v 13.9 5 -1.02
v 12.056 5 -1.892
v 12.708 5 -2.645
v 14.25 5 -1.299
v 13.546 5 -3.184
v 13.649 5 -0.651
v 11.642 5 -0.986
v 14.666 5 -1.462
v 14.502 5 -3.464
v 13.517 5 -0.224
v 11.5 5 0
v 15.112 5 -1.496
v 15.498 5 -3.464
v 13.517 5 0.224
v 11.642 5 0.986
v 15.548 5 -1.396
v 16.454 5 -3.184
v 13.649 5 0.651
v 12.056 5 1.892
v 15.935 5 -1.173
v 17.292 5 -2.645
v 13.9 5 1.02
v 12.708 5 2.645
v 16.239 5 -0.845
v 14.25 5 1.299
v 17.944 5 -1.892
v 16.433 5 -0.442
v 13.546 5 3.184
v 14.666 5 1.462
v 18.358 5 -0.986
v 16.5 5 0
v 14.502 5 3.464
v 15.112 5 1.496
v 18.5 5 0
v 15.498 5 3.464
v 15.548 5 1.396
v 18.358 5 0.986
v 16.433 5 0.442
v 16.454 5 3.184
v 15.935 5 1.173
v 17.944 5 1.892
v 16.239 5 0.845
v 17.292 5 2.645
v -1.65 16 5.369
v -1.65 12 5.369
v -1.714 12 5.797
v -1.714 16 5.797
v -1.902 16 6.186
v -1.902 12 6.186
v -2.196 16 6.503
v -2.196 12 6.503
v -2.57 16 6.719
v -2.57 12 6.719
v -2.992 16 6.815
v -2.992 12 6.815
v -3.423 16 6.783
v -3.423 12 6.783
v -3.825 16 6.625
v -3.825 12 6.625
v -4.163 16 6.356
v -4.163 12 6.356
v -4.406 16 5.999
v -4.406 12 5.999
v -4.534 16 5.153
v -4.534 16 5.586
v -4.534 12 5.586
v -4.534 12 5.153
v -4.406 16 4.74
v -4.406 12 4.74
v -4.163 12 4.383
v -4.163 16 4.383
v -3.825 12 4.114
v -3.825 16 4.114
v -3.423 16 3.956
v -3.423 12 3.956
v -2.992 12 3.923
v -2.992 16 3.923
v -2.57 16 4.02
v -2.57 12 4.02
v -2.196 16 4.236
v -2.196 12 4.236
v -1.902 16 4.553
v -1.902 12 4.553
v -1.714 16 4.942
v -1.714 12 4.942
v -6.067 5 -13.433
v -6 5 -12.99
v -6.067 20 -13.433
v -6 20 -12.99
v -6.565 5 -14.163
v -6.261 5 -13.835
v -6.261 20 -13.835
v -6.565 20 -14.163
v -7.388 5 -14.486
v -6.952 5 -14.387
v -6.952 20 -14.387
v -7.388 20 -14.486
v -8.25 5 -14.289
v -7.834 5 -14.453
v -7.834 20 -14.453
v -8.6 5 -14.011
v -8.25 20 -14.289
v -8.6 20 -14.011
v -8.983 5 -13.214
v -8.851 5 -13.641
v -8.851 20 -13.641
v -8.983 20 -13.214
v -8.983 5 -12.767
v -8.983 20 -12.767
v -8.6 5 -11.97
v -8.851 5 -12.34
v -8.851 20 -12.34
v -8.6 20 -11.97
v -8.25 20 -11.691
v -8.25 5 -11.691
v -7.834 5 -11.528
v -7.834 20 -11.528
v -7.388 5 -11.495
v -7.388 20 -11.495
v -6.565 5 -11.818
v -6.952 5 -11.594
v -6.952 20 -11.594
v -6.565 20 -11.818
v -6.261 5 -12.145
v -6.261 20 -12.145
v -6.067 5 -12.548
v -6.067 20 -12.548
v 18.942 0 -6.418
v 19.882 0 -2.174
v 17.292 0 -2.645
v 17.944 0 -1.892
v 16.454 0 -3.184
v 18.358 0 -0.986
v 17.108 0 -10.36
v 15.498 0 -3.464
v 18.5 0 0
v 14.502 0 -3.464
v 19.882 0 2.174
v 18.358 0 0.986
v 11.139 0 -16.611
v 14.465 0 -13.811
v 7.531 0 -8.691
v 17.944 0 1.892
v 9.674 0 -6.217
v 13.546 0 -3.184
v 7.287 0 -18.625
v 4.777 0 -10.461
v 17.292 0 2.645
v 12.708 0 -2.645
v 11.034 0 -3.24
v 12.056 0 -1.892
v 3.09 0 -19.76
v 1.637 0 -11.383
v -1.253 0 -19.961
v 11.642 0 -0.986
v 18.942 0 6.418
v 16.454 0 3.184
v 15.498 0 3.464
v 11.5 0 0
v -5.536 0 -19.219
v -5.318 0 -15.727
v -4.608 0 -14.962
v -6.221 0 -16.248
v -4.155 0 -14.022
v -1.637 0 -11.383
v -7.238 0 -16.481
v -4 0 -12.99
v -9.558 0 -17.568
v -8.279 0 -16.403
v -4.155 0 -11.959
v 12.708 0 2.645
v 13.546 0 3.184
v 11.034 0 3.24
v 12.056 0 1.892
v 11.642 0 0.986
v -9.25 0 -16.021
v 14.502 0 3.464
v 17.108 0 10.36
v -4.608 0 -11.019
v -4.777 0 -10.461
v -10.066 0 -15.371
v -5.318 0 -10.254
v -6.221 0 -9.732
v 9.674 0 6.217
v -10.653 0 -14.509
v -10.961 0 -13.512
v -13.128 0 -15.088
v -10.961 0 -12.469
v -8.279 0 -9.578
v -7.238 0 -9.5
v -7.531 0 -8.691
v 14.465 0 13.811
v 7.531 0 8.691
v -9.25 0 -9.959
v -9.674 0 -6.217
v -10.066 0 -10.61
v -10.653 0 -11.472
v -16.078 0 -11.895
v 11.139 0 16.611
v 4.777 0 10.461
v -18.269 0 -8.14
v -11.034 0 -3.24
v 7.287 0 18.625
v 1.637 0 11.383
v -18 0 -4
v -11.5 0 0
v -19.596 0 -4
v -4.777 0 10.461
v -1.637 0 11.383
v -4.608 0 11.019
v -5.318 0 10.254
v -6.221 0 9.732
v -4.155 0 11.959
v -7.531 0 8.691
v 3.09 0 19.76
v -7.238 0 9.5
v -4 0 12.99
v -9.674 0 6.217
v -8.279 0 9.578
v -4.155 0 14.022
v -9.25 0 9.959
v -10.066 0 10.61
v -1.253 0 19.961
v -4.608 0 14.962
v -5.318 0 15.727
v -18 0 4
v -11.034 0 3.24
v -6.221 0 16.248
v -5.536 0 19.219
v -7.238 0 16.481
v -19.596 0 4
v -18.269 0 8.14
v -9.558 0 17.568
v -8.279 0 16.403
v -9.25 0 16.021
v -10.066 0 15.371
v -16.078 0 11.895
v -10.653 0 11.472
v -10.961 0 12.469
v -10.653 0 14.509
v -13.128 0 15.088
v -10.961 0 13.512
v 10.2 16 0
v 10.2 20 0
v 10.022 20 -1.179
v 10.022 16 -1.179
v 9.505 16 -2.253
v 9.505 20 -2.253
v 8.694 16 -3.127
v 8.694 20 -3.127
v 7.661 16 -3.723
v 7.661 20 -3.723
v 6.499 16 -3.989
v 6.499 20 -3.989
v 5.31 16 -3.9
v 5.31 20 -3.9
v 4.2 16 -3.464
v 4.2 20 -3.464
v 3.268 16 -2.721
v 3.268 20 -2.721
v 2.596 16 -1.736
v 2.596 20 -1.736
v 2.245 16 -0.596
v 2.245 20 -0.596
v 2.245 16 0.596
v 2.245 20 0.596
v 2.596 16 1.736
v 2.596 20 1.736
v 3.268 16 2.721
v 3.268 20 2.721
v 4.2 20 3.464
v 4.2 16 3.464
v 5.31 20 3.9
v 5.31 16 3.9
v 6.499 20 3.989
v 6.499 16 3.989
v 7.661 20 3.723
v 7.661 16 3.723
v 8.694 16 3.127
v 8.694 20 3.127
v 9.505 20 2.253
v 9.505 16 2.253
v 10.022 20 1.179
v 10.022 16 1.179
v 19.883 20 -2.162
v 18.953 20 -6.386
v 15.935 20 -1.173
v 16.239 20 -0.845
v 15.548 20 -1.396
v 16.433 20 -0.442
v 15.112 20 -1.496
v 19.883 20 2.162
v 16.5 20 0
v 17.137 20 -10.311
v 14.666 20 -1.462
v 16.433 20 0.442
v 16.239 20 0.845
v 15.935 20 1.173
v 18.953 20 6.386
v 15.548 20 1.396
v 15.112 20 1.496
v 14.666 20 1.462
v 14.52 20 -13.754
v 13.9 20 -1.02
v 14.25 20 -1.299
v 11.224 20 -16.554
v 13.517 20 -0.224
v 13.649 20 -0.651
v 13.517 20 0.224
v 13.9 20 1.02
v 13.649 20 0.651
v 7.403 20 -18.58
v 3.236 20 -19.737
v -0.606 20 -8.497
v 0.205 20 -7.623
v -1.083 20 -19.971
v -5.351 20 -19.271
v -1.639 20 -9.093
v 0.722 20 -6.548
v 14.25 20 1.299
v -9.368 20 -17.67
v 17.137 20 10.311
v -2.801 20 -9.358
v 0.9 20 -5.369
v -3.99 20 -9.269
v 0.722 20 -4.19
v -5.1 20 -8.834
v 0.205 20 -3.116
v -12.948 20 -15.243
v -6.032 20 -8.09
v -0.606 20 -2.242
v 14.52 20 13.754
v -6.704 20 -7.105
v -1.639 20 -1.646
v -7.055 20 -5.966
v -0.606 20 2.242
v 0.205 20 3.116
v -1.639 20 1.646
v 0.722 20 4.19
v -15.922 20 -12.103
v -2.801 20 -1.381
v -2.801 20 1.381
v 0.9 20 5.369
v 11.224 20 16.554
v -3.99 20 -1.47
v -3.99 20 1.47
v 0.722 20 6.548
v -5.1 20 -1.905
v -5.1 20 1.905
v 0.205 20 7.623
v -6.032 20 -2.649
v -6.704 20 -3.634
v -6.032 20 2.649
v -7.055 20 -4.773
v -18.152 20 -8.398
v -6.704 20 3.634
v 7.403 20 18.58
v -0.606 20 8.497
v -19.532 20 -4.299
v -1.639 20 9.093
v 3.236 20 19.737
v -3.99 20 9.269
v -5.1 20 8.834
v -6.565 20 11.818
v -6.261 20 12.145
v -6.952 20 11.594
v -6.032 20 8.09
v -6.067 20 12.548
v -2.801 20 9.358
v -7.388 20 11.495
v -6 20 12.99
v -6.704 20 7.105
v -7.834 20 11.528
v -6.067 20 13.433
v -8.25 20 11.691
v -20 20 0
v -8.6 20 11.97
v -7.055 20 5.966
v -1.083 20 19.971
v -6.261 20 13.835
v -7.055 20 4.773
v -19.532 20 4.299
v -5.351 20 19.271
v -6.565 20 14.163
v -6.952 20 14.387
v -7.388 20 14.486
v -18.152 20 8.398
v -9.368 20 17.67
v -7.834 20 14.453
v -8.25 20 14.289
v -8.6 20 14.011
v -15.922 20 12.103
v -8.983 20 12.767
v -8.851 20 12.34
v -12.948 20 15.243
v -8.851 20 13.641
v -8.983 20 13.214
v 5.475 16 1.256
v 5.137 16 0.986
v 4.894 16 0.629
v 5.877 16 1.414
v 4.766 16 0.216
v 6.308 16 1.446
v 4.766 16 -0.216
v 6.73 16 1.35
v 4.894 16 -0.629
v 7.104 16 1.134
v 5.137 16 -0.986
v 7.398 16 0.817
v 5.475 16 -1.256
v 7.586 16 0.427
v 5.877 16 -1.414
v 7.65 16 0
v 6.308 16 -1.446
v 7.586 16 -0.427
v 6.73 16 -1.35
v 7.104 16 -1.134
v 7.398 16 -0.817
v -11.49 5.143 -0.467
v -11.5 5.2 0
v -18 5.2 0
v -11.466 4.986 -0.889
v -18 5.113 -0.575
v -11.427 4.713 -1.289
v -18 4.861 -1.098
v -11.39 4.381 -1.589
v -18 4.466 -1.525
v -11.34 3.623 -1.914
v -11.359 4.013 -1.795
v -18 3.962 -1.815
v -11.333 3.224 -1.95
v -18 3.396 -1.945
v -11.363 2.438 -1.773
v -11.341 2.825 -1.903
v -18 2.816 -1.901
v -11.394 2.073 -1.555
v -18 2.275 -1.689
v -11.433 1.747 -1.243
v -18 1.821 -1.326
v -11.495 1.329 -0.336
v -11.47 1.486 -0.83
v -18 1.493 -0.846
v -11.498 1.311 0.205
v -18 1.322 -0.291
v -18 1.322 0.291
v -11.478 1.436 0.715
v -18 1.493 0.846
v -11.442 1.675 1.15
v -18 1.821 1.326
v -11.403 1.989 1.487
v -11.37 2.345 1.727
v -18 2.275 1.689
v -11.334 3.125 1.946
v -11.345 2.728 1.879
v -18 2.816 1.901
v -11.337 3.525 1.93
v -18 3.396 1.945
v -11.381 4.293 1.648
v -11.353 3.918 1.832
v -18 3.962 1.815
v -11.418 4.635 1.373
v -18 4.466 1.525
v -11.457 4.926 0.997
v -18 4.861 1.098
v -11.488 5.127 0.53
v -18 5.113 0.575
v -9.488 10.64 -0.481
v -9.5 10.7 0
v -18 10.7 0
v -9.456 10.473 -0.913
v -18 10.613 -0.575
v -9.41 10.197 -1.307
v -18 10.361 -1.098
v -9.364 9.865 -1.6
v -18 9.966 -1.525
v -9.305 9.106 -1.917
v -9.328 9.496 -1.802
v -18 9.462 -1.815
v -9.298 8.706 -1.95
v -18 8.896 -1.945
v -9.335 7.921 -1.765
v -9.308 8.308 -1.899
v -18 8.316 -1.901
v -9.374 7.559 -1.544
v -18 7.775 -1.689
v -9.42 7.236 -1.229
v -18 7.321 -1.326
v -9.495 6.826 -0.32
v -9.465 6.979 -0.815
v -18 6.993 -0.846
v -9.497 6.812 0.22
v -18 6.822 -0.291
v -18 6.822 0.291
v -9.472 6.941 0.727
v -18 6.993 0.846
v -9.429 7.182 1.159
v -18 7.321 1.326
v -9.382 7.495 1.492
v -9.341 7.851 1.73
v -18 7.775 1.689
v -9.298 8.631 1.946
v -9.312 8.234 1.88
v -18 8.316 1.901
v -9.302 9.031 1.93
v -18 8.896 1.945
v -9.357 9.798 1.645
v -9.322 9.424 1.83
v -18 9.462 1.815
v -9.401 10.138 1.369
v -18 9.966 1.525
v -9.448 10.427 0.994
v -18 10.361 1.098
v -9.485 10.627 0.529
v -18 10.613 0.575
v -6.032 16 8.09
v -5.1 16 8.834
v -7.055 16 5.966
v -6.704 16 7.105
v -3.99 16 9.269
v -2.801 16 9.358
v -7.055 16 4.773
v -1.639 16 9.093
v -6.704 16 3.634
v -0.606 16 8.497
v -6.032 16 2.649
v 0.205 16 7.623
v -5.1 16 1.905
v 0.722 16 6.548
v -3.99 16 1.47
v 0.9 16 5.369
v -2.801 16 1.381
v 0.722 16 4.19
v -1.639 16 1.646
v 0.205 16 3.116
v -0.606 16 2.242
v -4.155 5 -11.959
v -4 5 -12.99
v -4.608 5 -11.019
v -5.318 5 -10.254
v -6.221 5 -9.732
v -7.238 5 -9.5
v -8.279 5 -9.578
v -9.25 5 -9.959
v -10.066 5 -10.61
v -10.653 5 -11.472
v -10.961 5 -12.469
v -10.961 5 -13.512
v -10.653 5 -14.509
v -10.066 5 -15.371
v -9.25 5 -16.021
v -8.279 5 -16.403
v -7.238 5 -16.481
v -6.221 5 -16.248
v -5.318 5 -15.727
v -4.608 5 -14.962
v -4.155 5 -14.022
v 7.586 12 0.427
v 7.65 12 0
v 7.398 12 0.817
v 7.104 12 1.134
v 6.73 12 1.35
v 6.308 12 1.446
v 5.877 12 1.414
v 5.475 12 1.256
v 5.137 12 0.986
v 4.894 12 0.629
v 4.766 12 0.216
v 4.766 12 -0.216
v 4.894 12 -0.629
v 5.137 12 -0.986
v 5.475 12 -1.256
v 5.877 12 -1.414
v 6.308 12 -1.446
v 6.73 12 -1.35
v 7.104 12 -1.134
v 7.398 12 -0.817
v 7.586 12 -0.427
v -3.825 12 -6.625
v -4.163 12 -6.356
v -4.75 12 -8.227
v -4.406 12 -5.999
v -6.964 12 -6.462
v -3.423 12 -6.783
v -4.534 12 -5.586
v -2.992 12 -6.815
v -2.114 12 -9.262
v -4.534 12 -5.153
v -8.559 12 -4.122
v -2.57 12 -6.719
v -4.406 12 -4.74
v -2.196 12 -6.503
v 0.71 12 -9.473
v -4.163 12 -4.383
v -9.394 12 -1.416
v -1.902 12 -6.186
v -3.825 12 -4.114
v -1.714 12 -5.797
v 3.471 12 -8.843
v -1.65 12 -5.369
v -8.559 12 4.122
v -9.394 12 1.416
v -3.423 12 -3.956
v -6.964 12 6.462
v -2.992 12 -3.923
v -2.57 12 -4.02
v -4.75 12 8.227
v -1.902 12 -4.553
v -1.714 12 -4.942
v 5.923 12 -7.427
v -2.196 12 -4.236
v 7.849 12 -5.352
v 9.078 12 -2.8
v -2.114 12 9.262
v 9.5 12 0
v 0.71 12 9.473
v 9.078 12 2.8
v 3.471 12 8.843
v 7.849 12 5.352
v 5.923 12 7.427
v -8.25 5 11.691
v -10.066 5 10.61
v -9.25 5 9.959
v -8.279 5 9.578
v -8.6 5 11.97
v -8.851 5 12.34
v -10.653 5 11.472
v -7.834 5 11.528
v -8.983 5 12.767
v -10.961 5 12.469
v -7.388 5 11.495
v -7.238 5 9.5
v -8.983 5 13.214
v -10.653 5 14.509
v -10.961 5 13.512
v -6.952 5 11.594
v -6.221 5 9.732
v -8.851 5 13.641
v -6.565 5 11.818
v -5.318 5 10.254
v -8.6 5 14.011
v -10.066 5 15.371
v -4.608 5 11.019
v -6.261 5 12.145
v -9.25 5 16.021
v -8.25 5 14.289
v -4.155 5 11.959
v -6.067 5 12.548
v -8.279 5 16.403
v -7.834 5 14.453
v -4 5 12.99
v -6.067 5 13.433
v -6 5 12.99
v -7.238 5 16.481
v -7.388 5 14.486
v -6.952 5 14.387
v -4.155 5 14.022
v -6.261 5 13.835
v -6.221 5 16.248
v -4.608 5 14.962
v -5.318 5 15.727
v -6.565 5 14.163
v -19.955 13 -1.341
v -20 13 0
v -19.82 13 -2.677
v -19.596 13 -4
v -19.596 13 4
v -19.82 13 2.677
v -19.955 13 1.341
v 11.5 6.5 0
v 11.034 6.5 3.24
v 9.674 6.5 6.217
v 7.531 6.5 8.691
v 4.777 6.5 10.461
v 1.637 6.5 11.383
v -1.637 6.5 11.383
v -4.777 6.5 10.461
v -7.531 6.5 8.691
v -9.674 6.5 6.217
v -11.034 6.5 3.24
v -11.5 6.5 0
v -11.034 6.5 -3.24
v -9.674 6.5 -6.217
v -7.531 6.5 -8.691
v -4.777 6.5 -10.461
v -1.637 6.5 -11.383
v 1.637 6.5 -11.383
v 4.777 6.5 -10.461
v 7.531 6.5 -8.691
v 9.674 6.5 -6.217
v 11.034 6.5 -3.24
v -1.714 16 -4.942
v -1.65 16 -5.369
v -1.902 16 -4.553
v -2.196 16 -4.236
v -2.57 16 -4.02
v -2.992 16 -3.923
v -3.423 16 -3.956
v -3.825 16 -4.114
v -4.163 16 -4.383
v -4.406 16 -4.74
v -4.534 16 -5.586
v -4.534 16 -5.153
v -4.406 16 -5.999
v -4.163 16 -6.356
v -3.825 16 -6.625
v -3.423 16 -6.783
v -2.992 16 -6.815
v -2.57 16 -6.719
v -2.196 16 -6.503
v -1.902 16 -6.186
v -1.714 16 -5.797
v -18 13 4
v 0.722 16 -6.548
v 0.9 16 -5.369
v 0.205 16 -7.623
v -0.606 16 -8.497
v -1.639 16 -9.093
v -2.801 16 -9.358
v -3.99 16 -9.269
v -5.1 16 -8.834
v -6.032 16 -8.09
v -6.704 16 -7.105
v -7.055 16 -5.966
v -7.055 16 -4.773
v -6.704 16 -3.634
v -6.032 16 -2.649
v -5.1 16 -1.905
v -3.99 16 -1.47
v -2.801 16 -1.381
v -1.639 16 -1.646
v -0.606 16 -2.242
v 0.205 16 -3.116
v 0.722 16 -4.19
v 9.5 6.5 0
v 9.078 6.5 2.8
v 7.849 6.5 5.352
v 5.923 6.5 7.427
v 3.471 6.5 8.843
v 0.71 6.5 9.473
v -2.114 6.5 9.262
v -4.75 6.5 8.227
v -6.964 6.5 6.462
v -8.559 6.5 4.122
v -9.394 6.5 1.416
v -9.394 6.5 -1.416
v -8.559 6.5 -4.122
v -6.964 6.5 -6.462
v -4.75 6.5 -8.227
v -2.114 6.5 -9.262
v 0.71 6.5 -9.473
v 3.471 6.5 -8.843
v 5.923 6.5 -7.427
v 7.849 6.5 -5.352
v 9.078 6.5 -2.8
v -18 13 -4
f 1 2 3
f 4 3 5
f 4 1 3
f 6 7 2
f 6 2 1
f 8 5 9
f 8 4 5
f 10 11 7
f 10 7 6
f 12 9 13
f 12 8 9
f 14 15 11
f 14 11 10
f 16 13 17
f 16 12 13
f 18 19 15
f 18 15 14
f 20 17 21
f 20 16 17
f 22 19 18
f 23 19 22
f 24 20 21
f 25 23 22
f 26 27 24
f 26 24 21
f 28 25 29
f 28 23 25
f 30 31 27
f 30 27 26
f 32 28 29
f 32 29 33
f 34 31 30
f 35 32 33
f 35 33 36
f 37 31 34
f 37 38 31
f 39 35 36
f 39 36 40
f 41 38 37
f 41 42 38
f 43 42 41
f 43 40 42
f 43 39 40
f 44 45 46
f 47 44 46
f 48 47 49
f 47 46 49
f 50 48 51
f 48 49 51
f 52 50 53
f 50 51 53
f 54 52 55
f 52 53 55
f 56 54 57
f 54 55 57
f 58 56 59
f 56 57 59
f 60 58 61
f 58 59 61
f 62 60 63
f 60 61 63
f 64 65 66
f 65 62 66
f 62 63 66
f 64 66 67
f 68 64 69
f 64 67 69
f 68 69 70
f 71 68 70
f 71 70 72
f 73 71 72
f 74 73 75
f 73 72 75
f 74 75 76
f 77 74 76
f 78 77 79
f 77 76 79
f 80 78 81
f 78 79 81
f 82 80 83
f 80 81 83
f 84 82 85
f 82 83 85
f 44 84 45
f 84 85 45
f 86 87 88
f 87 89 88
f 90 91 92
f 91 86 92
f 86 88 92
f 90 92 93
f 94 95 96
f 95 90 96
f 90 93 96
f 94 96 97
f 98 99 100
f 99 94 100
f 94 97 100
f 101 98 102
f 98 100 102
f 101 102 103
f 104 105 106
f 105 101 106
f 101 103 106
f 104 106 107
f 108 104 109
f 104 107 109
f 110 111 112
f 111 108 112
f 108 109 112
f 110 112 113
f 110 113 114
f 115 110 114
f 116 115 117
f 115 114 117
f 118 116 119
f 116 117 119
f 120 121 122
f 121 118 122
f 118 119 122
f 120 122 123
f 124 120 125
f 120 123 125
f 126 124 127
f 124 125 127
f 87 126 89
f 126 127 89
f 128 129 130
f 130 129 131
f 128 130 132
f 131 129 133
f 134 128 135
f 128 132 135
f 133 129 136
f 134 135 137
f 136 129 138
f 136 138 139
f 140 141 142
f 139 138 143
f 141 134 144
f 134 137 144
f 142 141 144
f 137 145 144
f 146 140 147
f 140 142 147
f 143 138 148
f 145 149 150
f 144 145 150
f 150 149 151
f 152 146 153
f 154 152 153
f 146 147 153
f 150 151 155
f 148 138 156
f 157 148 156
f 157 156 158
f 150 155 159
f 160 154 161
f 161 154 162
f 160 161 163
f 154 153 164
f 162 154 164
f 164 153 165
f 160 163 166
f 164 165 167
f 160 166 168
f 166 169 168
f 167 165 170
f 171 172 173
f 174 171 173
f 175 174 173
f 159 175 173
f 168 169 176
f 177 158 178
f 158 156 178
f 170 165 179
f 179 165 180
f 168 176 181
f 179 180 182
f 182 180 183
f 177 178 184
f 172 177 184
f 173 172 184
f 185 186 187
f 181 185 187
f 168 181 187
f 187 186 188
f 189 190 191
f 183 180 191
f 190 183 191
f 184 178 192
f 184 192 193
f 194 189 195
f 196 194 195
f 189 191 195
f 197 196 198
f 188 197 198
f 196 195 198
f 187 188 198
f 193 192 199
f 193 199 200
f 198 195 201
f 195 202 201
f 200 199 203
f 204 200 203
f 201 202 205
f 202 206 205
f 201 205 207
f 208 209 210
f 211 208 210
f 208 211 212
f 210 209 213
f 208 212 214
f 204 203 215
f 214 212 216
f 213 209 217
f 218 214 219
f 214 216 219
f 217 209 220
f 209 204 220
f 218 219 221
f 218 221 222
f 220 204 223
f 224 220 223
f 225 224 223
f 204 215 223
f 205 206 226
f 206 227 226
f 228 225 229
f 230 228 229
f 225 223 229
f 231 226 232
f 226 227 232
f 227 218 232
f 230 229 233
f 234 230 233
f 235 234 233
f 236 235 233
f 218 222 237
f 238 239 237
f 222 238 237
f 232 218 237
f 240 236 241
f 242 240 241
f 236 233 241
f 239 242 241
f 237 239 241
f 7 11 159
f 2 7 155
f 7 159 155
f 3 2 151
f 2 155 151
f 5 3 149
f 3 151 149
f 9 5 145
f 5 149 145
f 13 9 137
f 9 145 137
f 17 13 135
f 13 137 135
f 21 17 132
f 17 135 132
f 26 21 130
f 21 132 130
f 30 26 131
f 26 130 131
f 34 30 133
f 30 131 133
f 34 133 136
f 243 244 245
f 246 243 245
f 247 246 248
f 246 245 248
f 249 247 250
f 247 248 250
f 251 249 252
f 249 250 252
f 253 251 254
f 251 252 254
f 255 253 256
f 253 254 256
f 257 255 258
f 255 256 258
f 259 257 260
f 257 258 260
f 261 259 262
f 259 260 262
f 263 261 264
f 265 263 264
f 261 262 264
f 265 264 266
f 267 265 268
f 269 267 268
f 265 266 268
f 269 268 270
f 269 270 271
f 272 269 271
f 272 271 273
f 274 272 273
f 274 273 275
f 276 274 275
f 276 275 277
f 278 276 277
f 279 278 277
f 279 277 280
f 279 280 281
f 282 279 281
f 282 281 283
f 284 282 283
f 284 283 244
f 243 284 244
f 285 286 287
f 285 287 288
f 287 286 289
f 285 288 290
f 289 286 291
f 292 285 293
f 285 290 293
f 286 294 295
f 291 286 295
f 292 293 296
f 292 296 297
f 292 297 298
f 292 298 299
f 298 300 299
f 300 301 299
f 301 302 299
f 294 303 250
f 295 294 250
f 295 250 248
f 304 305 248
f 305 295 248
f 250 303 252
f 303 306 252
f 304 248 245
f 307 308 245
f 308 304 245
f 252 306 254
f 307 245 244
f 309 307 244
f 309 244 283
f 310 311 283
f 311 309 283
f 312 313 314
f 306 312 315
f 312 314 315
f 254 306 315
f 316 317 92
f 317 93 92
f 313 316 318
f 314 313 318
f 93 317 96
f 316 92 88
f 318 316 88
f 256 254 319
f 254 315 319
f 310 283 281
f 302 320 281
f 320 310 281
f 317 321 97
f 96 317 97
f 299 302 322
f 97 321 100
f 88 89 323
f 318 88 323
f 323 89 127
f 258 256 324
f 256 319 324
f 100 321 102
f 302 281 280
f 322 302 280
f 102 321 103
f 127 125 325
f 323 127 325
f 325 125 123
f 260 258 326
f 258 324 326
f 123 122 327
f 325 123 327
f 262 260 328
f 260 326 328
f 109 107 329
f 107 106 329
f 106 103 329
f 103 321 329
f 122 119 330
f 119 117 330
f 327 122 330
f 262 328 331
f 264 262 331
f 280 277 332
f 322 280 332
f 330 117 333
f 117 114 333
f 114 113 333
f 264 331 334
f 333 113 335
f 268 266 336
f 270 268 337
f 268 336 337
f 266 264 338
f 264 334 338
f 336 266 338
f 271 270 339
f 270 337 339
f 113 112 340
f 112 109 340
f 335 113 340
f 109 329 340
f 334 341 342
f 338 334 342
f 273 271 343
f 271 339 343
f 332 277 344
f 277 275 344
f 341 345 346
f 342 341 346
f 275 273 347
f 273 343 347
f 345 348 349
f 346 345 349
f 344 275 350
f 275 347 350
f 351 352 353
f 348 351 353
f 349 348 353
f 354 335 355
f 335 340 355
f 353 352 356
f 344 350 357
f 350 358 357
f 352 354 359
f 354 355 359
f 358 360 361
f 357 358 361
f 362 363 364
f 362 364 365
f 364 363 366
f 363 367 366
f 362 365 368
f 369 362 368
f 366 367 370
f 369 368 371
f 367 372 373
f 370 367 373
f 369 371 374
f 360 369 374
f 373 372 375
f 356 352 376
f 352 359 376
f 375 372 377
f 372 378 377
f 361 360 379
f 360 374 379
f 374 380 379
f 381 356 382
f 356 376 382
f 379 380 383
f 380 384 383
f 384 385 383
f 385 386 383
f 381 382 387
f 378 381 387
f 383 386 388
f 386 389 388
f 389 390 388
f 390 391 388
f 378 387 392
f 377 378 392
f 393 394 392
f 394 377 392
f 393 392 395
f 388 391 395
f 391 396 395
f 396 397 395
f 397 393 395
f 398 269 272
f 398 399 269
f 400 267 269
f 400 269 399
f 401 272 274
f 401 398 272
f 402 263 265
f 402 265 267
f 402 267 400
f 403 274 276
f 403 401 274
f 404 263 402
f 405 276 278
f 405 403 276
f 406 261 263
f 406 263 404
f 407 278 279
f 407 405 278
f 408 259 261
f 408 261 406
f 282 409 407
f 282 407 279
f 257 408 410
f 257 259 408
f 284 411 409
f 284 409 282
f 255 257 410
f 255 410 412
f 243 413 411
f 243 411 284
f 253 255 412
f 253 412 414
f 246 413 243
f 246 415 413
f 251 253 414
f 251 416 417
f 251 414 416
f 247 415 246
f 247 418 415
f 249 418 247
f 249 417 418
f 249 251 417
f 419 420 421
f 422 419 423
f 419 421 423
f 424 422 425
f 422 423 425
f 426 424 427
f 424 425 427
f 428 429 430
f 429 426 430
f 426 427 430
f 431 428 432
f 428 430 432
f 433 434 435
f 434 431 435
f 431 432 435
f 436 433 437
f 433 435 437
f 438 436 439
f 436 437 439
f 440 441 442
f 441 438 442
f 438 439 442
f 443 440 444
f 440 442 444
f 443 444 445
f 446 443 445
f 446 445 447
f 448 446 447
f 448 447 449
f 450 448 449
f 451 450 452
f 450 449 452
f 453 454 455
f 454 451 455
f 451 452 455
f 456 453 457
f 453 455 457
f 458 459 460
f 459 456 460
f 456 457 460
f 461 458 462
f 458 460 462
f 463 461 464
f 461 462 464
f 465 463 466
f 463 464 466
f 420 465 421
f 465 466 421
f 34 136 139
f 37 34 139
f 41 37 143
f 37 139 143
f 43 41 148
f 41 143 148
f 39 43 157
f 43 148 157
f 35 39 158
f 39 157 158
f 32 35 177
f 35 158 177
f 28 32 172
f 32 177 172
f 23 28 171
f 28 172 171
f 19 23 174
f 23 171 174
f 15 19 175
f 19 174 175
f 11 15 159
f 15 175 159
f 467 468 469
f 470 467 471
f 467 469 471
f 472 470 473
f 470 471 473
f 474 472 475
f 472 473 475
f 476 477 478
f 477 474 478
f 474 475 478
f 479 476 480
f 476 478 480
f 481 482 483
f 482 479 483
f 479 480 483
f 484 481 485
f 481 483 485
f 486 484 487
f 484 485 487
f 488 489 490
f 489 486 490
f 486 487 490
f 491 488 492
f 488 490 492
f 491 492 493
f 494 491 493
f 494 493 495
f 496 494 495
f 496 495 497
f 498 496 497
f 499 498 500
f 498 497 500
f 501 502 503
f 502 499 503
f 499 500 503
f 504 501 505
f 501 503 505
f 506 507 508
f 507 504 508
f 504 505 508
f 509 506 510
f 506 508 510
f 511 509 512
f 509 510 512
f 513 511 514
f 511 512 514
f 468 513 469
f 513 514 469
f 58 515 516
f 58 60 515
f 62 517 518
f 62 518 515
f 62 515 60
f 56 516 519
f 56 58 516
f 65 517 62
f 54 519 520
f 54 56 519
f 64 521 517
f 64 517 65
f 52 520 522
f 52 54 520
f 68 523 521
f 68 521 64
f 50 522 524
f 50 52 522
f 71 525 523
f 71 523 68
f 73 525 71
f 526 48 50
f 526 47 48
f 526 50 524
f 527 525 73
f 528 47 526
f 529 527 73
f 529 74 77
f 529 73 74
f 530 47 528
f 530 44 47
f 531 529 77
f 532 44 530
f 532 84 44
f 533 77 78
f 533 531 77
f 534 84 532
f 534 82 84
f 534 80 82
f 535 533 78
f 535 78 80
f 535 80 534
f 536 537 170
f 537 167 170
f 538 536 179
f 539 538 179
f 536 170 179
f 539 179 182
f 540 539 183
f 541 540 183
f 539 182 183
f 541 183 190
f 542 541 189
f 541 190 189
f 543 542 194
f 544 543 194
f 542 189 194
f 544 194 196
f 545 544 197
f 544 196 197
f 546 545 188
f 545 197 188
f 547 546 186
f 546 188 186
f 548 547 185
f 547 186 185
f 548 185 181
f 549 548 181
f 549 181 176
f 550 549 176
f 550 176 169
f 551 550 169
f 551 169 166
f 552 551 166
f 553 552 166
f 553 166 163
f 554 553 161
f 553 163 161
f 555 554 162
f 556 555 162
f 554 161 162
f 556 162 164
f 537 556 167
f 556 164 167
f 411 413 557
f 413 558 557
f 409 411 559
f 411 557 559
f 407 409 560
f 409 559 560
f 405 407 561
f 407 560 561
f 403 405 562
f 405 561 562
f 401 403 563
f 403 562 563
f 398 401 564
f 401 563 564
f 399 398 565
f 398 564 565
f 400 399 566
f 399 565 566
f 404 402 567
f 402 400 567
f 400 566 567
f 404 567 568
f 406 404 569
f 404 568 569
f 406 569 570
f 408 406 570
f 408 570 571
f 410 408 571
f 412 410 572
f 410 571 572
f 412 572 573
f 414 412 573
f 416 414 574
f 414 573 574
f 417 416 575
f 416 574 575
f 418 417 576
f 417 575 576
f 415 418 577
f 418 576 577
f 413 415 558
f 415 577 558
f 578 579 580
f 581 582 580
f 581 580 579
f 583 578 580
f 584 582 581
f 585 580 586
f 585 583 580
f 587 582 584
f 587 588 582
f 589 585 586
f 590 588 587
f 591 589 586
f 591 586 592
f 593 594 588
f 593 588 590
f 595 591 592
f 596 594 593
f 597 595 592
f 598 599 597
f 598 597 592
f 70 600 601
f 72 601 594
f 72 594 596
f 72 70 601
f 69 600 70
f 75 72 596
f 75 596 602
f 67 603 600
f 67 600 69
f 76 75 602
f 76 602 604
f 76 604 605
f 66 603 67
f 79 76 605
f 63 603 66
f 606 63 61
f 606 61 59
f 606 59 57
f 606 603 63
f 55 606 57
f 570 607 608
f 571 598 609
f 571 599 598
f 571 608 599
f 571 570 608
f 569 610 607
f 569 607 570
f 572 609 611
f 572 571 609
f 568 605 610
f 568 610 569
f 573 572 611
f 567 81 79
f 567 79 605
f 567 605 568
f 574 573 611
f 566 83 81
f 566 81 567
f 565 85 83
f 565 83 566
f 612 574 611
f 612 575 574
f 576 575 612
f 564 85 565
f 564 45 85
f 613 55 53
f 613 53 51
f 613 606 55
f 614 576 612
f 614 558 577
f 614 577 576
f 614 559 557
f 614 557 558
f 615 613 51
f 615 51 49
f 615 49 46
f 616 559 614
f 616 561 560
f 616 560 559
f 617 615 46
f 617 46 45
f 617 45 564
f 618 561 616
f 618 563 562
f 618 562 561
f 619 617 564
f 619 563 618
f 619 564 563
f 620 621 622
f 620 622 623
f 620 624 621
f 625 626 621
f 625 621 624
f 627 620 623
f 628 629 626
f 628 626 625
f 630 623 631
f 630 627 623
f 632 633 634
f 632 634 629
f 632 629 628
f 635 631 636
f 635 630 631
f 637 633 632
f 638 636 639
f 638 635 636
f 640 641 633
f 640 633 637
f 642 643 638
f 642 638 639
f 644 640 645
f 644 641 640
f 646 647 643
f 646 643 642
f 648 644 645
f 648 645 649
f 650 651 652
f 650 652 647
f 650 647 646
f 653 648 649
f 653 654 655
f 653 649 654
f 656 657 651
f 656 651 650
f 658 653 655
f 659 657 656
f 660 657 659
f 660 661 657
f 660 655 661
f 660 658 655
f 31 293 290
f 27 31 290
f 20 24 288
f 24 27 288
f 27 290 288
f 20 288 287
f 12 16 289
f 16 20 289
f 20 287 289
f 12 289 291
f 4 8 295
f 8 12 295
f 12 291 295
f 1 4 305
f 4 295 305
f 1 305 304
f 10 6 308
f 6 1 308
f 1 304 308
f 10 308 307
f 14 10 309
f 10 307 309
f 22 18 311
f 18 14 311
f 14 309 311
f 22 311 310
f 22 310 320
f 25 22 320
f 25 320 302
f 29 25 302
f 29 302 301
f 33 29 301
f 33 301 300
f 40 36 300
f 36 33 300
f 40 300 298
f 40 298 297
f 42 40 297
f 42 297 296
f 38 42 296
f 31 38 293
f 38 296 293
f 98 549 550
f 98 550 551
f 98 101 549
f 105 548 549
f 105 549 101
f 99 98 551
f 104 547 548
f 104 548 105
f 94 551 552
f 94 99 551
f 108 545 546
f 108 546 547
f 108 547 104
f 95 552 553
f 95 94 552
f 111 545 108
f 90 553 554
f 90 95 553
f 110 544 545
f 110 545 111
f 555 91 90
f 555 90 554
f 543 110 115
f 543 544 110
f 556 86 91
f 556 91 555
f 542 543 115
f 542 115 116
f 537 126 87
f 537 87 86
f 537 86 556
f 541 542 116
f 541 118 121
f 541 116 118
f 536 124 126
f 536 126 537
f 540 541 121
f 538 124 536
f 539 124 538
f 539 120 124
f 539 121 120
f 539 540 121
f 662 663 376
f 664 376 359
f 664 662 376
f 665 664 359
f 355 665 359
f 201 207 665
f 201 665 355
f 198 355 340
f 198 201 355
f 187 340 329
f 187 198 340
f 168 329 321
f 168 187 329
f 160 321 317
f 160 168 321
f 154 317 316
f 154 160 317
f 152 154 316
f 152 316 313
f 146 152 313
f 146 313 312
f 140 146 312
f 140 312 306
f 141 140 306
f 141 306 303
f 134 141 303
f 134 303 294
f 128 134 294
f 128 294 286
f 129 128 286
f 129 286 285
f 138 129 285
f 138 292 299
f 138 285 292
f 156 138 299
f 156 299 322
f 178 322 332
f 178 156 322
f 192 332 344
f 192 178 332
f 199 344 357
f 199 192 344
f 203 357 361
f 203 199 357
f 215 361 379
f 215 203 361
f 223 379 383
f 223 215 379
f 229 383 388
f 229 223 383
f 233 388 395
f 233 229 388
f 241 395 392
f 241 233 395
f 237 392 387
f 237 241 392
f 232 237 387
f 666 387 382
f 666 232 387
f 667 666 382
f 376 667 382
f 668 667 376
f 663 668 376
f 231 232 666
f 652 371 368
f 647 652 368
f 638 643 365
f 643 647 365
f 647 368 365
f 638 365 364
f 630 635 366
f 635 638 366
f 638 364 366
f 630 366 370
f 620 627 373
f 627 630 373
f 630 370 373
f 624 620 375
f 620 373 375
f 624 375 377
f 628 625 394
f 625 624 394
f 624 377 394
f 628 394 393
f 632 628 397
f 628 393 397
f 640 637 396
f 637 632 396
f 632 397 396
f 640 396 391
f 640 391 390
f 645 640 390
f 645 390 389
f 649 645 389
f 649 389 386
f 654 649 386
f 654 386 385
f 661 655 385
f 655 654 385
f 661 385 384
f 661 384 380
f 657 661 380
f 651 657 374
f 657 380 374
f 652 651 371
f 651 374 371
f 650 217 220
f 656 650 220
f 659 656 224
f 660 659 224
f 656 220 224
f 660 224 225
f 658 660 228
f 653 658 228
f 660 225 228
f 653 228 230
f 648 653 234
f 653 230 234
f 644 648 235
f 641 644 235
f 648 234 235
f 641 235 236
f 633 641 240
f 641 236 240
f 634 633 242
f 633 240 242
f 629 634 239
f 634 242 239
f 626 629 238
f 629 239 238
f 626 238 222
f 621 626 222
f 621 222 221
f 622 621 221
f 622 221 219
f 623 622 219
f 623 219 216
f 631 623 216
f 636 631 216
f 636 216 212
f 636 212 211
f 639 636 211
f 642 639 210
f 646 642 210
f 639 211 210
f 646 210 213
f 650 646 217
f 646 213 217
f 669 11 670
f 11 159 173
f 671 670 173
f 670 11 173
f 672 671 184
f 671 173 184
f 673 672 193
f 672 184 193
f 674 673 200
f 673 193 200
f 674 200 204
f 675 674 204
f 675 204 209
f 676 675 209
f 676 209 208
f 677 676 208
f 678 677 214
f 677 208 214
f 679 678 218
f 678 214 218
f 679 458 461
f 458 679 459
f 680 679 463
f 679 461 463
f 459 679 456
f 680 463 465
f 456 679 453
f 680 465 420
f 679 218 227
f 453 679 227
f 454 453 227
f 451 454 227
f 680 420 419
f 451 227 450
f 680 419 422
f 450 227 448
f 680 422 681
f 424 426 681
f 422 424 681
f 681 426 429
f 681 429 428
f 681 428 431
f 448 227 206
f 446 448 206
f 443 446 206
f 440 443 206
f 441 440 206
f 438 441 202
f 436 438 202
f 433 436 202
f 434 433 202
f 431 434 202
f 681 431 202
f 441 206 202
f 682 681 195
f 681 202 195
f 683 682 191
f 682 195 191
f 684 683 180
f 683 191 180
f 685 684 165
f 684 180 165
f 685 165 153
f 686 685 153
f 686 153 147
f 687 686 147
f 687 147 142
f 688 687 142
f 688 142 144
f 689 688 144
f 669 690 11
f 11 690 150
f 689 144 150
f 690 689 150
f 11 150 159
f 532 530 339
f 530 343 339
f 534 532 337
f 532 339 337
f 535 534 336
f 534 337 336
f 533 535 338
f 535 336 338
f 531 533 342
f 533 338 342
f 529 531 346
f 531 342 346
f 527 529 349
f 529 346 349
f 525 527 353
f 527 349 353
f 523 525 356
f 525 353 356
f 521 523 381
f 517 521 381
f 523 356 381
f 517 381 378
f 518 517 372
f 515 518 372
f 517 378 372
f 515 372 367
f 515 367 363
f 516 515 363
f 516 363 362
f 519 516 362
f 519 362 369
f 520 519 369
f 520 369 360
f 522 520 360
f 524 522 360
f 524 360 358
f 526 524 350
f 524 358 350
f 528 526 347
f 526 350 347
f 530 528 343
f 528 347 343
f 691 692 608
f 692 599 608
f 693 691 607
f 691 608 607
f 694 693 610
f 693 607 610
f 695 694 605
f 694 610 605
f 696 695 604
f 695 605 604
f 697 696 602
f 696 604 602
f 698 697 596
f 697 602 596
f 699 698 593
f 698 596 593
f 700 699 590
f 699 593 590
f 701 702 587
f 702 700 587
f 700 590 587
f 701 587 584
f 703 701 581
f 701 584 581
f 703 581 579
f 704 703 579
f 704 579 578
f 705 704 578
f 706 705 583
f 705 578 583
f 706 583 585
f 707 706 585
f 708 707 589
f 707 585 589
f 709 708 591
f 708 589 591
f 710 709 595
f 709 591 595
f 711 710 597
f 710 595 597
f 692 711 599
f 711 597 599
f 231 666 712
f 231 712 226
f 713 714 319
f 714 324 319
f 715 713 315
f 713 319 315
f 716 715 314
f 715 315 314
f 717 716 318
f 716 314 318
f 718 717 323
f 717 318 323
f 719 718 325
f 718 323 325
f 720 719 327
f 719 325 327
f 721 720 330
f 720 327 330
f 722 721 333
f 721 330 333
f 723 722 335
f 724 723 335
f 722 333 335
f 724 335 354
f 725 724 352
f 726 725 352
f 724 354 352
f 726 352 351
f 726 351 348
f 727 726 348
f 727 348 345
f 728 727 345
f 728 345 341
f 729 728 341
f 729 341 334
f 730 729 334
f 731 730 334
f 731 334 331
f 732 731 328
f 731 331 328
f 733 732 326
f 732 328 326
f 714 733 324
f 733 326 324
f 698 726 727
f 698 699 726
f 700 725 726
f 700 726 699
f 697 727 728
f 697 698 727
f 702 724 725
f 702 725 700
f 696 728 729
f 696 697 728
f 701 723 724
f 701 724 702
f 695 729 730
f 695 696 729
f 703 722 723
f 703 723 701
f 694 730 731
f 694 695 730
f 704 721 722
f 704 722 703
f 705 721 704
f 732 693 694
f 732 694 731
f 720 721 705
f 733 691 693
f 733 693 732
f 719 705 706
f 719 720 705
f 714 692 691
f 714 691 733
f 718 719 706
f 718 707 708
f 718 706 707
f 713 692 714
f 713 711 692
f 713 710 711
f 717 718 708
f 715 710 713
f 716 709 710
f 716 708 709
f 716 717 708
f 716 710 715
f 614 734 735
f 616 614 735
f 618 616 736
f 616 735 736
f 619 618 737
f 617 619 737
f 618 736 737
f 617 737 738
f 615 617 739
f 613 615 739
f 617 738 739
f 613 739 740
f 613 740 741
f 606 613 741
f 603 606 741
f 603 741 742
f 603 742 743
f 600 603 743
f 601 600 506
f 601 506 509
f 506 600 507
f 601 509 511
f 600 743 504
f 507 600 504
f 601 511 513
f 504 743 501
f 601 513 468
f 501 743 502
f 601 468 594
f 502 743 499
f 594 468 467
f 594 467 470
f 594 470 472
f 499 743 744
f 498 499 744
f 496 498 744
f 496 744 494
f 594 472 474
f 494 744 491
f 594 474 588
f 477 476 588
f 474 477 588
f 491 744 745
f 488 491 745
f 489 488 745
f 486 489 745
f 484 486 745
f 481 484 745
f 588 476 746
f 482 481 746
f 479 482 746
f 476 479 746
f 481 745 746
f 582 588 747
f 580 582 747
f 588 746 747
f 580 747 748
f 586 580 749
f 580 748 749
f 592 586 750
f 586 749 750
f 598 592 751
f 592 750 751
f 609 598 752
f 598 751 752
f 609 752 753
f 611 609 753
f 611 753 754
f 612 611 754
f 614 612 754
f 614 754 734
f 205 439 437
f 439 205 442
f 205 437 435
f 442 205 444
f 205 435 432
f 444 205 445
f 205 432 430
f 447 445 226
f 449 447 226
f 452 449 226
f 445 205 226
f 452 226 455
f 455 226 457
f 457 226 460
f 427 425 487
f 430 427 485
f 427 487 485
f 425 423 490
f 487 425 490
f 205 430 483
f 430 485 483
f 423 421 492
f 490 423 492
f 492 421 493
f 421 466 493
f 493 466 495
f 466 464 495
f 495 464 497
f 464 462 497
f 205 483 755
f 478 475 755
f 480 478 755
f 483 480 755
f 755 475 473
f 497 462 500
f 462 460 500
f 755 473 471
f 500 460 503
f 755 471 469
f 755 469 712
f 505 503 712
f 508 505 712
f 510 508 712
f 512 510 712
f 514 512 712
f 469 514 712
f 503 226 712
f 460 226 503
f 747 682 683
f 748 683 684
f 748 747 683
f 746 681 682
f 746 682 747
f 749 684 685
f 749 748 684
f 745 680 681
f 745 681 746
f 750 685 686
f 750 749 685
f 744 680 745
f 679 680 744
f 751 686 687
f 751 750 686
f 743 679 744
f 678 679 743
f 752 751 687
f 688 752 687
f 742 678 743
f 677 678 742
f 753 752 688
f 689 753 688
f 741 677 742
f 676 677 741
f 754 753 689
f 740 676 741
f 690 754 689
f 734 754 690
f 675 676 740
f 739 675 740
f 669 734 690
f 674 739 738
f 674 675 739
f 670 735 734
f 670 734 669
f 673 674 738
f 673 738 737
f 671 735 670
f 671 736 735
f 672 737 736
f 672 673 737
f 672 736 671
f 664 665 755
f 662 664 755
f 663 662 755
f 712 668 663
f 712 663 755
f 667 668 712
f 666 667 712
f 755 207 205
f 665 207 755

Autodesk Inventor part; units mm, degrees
sketch "Sketch1" plane through (0, 0, 0) normal (0, 1, 0) x (-1, 0, 0)
  circle A0 centre (0, 0) radius 20
  dimension "d0" = 40
extrude "Extrusion1" add sketch "Sketch1" along normal blind 30
sketch "Sketch2" plane through (0, 30, 0) normal (0, 1, 0) x (1, 0, 0)
  circle A0 centre (0, 0) radius 10
  dimension "d3" = 20
extrude "Extrusion2" add sketch "Sketch2" along normal blind 60
sketch "Sketch3" plane through (0, 90, 0) normal (0, 1, 0) x (1, 0, 0)
  circle A0 centre (0, 0) radius 10 projected
  circle A1 centre (0, 0) radius 10
  circle A2 centre (0, 0) radius 6
  dimension "d6" = 20
  dimension "d7" = 12
extrude "Extrusion3" cut sketch "Sketch3" against normal blind 16
sketch "Sketch4" plane through (0, 0, 0) normal (0, -1, 0) x (1, 0, 0)
  circle A0 centre (0, 0) radius 2
  line L0 (1.5, 1.3229) -> (1.5, -1.3229)
  dimension "d10" = 4
  dimension "d11" = 3.5
extrude "Extrusion4" cut sketch "Sketch4" against normal blind 10 contours L0 A0 picked at (-0.0779, 0.6608)
fillet "Fillet1" radius 7 1 edges at (-10, 30, 0)
fillet "Fillet2" radius 7 1 edges at (20, 30, 0)
fillet "Fillet3" radius 4 1 edges at (-6, 90, 0)
ref_plane "Work Plane1" through (6, 0, 0) normal (1, 0, 0) x (0, 1, 0)
ref_plane "Work Plane2" through (-6, 0, 0) normal (1, 0, 0) x (0, 1, 0)
ref_plane "Work Plane3" through (10, 0, 0) normal (1, 0, 0) x (0, 1, 0)
sketch "Sketch7" plane through (10, 0, 0) normal (1, 0, 0) x (0, 1, 0)
  line L0 (57, 6.8) -> (37.3, 6.8)
  line L1 (37.3, 6.8) -> (37.3, -6.8)
  line L2 (37.3, -6.8) -> (57, -6.8)
  line L3 (57, -6.8) -> (57, 6.8)
  line L4 (-9.9161, 0) -> (11.1387, 0)
  line L5 (74, 10) -> (74, -10) projected
  line L6 (37.3, -6.8) -> (32.3, -6.8)
  line L7 (37.3, 4) -> (31.3, 4)
  line L8 (31.3, 4) -> (31.3, -4)
  line L9 (31.3, -4) -> (37.3, -4)
  line L10 (37.3, -4) -> (37.3, 4)
  point P0 (0, 0)
  dimension "d26" = 6.8
  dimension "d27" = 13.6
  dimension "d28" = 19.7
  dimension "d29" = 17
  dimension "d30" = 0
  dimension "d31" = 5
  dimension "d32" = 6
  dimension "d33" = 8
  dimension "d38" = 4
  dimension "d39" = 0
extrude "Extrusion6" cut sketch "Sketch7" along normal blind 2 and the other way blind 4
ref_plane "Work Plane4" through (12, 31.3, 4) normal (0.7071, 0.7071, 0) x (0, 0, -1)
sketch "Sketch8" plane through (12, 31.3, 4) normal (0.7071, 0.7071, 0) x (0, 0, -1)
  line L0 (8, 4.2426) -> (8, 0) projected
  line L1 (8, 4.3868) -> (0, 4.3868)
  line L2 (0, 4.3868) -> (0, -12.1132)
  line L3 (0, -12.1132) -> (8, -12.1132)
  line L4 (8, -12.1132) -> (8, 4.3868)
  ellipse E0 centre (4, 26.6579) end of major axis (14, 26.6579) minor radius 7.0711 (-2.8, 21.4733) -> (10.8, 21.4733) ccw projected
  point P0 (4, -13.6472)
  point P1 (8, 4.2426)
  dimension "d41" = 8
  dimension "d42" = 16.5
  dimension "d52" = 22.2711
extrude "Extrusion7" cut sketch "Sketch8" along normal blind 3 and the other way blind 4.2
ref_plane "Work Plane5" through (0, 0, 6) normal (0, 0, 1) x (1, 0, 0)
sketch "Sketch9" plane through (0, 0, 6) normal (0, 0, 1) x (1, 0, 0)
  circle A0 centre (0, 79) radius 1.5
  line L0 (-10, 74) -> (10, 74) projected
  point P0 (0, 0)
  dimension "d48" = 3
  dimension "d49" = 5
extrude "Extrusion8" cut sketch "Sketch9" against normal blind 3
mirror "Mirror2" about plane through (0, 0, 0) normal (0, 0, 1) of "Extrusion8"
sketch "Sketch10" plane through (0, 0, 0) normal (0, -1, 0) x (1, 0, 0)
  circle A0 centre (0, 0) radius 9.5
  dimension "d53" = 19
extrude "Extrusion9" cut sketch "Sketch10" against normal blind 12
sketch "Sketch11" plane through (0, 0, 0) normal (0, -1, 0) x (1, 0, 0)
  circle A0 centre (0, 0) radius 9.5 projected
  circle A1 centre (0, 0) radius 11.5
  dimension "d56" = 23
extrude "Extrusion10" cut sketch "Sketch11" against normal blind 6.5
ref_plane "Work Plane6" through (-20, 0, 0) normal (1, 0, 0) x (0, 1, 0)
sketch "Sketch12" plane through (-20, 0, 0) normal (1, 0, 0) x (0, 1, 0)
  line L0 (0, -20) -> (0, 20) projected
  line L1 (0, -11.1927) -> (6.5, -11.1927)
  line L2 (6.5, -11.1927) -> (6.5, 10.8073)
  line L3 (6.5, 10.8073) -> (0, 10.8073)
  line L4 (0, 10.8073) -> (0, -11.1927)
  circle A0 centre (3.25, 0) radius 1.95
  circle A1 centre (8.75, 0) radius 1.95
  point P0 (0, 0)
  dimension "d60" = 22
  dimension "d61" = 3.9
  dimension "d62" = 6.5
  dimension "d63" = 3.25
  dimension "d64" = 0
  dimension "d65" = 3.9
  dimension "d66" = 5.5
extrude "Extrusion11" cut sketch "Sketch12" along normal blind 18 contours A0 | A1
sketch "Sketch13" plane through (-20, 0, 0) normal (1, 0, 0) x (0, 1, 0)
  line L0 (0, -4) -> (13, -4)
  line L1 (13, -4) -> (13, 4)
  line L2 (13, 4) -> (0, 4)
  line L3 (0, 4) -> (0, -4)
  point P0 (0, 0)
  dimension "d70" = 8
  dimension "d71" = 4
  dimension "d72" = 13
extrude "Extrusion12" cut sketch "Sketch13" along normal blind 2
sketch "Sketch14" plane through (0, 12, 0) normal (0, -1, 0) x (1, 0, 0)
  circle A0 centre (0, 0) radius 6.2
  line L0 (0, 0) -> (7.6867, 0)
  line L1 (0, 0) -> (-3.9527, 6.8463)
  line L2 (0, 0) -> (-3.8209, -6.618)
  circle A1 centre (-3.1, 5.3694) radius 1.45
  circle A2 centre (-3.1, -5.3694) radius 1.45
  circle A3 centre (6.2, 0) radius 1.45
  dimension "d75" = 12.4
  dimension "d76" = 120
  dimension "d77" = 120
  dimension "d79" = 2.9
  dimension "d80" = 2.9
  dimension "d81" = 2.9
extrude "Extrusion13" cut sketch "Sketch14" against normal blind 12 contours L0 A3 A0 | L0 A3 A0 | A0 A3 L0 | A0 A3 L0 | A1 L1 A0 | A0 L1 A1 | A2 A0 | A0 L2 A2 | L1 A1 A0 | A0 A1 L1 | A0 A2 L2
sketch "Sketch15" plane through (0, 0, 0) normal (1, 0, 0) x (0, 1, 0)
  line L0 (95, -20.5708) -> (0, -20.5708)
  line L1 (0, -20.5708) -> (0, 21.1406)
  line L2 (0, 21.1406) -> (95, 21.1406)
  line L3 (95, 21.1406) -> (95, -20.5708)
  line L4 (20, -20.5708) -> (20, 21.1406)
  point P0 (0, 0)
  dimension "d84" = 20
  dimension "d85" = 41.7114
  dimension "d86" = 95
extrude "Extrusion14" cut sketch "Sketch15" along normal mid plane 40 contours L0 L4 L2 L3
sketch "Sketch16" plane through (0, 20, 0) normal (0, 1, 0) x (1, 0, 0)
  line L0 (18.2415, 4.1496) -> (17.0061, 4.1496)
  line L1 (17.0061, 4.1496) -> (17.0061, -4.2806)
  line L2 (17.0061, -4.2806) -> (18.2415, -4.2806)
  line L3 (18.2415, -4.2806) -> (18.2415, 4.1496)
  point P0 (0, 0)
extrude "Extrusion15" add sketch "Sketch16" against normal blind 3
sketch "Sketch17" plane through (0, 20, 0) normal (0, 1, 0) x (1, 0, 0)
  circle A0 centre (0, 0) radius 15
  circle A1 centre (-3.1, -5.3694) radius 1.45 projected
  circle A2 centre (-3.1, -5.3694) radius 4
  circle A3 centre (-3.1, 5.3694) radius 1.45 projected
  circle A4 centre (-3.1, 5.3694) radius 4
  circle A5 centre (6.2, 0) radius 1.45 projected
  circle A6 centre (6.2, 0) radius 4
  dimension "d91" = 30
  dimension "d92" = 8
  dimension "d93" = 8
  dimension "d94" = 8
extrude "Extrusion16" cut sketch "Sketch17" against normal blind 4 contours A2 | A4 | A6
sketch "Sketch18" plane through (0, 20, 0) normal (0, 1, 0) x (1, 0, 0)
  circle A0 centre (0, 0) radius 15
  line L0 (0, 0) -> (18.2122, 0)
  line L1 (0, 0) -> (-8.7364, -15.1318)
  line L2 (0, 0) -> (-8.9499, 15.5016)
  circle A1 centre (15, 0) radius 1.5
  circle A2 centre (-7.5, -12.9904) radius 1.5
  circle A3 centre (-7.5, 12.9904) radius 1.5
  dimension "d97" = 30
  dimension "d98" = 120
  dimension "d99" = 120
  dimension "d100" = 3
  dimension "d101" = 3
  dimension "d102" = 3
extrude "Extrusion17" cut sketch "Sketch18" against normal blind 40 contours L0 A1 A0 | L0 A1 A0 | A0 A1 L0 | A0 A1 L0 | A3 L2 A0 | A0 L2 A3 | A2 L1 A0 | A0 L1 A2 | L2 A3 A0 | A0 A3 L2 | L1 A2 A0 | A0 A2 L1
sketch "Sketch19" plane through (0, 0, 0) normal (0, -1, 0) x (1, 0, 0)
  circle A0 centre (-7.5, -12.9904) radius 1.5 projected
  circle A1 centre (-7.5, -12.9904) radius 3.5
  circle A2 centre (15, 0) radius 1.5 projected
  circle A3 centre (15, 0) radius 3.5
  circle A4 centre (-7.5, 12.9904) radius 1.5 projected
  circle A5 centre (-7.5, 12.9904) radius 3.5
  point P0 (0, 0)
  dimension "d105" = 7
  dimension "d106" = 7
  dimension "d107" = 7
extrude "Extrusion18" cut sketch "Sketch19" against normal blind 5
properties part number "EF1"
